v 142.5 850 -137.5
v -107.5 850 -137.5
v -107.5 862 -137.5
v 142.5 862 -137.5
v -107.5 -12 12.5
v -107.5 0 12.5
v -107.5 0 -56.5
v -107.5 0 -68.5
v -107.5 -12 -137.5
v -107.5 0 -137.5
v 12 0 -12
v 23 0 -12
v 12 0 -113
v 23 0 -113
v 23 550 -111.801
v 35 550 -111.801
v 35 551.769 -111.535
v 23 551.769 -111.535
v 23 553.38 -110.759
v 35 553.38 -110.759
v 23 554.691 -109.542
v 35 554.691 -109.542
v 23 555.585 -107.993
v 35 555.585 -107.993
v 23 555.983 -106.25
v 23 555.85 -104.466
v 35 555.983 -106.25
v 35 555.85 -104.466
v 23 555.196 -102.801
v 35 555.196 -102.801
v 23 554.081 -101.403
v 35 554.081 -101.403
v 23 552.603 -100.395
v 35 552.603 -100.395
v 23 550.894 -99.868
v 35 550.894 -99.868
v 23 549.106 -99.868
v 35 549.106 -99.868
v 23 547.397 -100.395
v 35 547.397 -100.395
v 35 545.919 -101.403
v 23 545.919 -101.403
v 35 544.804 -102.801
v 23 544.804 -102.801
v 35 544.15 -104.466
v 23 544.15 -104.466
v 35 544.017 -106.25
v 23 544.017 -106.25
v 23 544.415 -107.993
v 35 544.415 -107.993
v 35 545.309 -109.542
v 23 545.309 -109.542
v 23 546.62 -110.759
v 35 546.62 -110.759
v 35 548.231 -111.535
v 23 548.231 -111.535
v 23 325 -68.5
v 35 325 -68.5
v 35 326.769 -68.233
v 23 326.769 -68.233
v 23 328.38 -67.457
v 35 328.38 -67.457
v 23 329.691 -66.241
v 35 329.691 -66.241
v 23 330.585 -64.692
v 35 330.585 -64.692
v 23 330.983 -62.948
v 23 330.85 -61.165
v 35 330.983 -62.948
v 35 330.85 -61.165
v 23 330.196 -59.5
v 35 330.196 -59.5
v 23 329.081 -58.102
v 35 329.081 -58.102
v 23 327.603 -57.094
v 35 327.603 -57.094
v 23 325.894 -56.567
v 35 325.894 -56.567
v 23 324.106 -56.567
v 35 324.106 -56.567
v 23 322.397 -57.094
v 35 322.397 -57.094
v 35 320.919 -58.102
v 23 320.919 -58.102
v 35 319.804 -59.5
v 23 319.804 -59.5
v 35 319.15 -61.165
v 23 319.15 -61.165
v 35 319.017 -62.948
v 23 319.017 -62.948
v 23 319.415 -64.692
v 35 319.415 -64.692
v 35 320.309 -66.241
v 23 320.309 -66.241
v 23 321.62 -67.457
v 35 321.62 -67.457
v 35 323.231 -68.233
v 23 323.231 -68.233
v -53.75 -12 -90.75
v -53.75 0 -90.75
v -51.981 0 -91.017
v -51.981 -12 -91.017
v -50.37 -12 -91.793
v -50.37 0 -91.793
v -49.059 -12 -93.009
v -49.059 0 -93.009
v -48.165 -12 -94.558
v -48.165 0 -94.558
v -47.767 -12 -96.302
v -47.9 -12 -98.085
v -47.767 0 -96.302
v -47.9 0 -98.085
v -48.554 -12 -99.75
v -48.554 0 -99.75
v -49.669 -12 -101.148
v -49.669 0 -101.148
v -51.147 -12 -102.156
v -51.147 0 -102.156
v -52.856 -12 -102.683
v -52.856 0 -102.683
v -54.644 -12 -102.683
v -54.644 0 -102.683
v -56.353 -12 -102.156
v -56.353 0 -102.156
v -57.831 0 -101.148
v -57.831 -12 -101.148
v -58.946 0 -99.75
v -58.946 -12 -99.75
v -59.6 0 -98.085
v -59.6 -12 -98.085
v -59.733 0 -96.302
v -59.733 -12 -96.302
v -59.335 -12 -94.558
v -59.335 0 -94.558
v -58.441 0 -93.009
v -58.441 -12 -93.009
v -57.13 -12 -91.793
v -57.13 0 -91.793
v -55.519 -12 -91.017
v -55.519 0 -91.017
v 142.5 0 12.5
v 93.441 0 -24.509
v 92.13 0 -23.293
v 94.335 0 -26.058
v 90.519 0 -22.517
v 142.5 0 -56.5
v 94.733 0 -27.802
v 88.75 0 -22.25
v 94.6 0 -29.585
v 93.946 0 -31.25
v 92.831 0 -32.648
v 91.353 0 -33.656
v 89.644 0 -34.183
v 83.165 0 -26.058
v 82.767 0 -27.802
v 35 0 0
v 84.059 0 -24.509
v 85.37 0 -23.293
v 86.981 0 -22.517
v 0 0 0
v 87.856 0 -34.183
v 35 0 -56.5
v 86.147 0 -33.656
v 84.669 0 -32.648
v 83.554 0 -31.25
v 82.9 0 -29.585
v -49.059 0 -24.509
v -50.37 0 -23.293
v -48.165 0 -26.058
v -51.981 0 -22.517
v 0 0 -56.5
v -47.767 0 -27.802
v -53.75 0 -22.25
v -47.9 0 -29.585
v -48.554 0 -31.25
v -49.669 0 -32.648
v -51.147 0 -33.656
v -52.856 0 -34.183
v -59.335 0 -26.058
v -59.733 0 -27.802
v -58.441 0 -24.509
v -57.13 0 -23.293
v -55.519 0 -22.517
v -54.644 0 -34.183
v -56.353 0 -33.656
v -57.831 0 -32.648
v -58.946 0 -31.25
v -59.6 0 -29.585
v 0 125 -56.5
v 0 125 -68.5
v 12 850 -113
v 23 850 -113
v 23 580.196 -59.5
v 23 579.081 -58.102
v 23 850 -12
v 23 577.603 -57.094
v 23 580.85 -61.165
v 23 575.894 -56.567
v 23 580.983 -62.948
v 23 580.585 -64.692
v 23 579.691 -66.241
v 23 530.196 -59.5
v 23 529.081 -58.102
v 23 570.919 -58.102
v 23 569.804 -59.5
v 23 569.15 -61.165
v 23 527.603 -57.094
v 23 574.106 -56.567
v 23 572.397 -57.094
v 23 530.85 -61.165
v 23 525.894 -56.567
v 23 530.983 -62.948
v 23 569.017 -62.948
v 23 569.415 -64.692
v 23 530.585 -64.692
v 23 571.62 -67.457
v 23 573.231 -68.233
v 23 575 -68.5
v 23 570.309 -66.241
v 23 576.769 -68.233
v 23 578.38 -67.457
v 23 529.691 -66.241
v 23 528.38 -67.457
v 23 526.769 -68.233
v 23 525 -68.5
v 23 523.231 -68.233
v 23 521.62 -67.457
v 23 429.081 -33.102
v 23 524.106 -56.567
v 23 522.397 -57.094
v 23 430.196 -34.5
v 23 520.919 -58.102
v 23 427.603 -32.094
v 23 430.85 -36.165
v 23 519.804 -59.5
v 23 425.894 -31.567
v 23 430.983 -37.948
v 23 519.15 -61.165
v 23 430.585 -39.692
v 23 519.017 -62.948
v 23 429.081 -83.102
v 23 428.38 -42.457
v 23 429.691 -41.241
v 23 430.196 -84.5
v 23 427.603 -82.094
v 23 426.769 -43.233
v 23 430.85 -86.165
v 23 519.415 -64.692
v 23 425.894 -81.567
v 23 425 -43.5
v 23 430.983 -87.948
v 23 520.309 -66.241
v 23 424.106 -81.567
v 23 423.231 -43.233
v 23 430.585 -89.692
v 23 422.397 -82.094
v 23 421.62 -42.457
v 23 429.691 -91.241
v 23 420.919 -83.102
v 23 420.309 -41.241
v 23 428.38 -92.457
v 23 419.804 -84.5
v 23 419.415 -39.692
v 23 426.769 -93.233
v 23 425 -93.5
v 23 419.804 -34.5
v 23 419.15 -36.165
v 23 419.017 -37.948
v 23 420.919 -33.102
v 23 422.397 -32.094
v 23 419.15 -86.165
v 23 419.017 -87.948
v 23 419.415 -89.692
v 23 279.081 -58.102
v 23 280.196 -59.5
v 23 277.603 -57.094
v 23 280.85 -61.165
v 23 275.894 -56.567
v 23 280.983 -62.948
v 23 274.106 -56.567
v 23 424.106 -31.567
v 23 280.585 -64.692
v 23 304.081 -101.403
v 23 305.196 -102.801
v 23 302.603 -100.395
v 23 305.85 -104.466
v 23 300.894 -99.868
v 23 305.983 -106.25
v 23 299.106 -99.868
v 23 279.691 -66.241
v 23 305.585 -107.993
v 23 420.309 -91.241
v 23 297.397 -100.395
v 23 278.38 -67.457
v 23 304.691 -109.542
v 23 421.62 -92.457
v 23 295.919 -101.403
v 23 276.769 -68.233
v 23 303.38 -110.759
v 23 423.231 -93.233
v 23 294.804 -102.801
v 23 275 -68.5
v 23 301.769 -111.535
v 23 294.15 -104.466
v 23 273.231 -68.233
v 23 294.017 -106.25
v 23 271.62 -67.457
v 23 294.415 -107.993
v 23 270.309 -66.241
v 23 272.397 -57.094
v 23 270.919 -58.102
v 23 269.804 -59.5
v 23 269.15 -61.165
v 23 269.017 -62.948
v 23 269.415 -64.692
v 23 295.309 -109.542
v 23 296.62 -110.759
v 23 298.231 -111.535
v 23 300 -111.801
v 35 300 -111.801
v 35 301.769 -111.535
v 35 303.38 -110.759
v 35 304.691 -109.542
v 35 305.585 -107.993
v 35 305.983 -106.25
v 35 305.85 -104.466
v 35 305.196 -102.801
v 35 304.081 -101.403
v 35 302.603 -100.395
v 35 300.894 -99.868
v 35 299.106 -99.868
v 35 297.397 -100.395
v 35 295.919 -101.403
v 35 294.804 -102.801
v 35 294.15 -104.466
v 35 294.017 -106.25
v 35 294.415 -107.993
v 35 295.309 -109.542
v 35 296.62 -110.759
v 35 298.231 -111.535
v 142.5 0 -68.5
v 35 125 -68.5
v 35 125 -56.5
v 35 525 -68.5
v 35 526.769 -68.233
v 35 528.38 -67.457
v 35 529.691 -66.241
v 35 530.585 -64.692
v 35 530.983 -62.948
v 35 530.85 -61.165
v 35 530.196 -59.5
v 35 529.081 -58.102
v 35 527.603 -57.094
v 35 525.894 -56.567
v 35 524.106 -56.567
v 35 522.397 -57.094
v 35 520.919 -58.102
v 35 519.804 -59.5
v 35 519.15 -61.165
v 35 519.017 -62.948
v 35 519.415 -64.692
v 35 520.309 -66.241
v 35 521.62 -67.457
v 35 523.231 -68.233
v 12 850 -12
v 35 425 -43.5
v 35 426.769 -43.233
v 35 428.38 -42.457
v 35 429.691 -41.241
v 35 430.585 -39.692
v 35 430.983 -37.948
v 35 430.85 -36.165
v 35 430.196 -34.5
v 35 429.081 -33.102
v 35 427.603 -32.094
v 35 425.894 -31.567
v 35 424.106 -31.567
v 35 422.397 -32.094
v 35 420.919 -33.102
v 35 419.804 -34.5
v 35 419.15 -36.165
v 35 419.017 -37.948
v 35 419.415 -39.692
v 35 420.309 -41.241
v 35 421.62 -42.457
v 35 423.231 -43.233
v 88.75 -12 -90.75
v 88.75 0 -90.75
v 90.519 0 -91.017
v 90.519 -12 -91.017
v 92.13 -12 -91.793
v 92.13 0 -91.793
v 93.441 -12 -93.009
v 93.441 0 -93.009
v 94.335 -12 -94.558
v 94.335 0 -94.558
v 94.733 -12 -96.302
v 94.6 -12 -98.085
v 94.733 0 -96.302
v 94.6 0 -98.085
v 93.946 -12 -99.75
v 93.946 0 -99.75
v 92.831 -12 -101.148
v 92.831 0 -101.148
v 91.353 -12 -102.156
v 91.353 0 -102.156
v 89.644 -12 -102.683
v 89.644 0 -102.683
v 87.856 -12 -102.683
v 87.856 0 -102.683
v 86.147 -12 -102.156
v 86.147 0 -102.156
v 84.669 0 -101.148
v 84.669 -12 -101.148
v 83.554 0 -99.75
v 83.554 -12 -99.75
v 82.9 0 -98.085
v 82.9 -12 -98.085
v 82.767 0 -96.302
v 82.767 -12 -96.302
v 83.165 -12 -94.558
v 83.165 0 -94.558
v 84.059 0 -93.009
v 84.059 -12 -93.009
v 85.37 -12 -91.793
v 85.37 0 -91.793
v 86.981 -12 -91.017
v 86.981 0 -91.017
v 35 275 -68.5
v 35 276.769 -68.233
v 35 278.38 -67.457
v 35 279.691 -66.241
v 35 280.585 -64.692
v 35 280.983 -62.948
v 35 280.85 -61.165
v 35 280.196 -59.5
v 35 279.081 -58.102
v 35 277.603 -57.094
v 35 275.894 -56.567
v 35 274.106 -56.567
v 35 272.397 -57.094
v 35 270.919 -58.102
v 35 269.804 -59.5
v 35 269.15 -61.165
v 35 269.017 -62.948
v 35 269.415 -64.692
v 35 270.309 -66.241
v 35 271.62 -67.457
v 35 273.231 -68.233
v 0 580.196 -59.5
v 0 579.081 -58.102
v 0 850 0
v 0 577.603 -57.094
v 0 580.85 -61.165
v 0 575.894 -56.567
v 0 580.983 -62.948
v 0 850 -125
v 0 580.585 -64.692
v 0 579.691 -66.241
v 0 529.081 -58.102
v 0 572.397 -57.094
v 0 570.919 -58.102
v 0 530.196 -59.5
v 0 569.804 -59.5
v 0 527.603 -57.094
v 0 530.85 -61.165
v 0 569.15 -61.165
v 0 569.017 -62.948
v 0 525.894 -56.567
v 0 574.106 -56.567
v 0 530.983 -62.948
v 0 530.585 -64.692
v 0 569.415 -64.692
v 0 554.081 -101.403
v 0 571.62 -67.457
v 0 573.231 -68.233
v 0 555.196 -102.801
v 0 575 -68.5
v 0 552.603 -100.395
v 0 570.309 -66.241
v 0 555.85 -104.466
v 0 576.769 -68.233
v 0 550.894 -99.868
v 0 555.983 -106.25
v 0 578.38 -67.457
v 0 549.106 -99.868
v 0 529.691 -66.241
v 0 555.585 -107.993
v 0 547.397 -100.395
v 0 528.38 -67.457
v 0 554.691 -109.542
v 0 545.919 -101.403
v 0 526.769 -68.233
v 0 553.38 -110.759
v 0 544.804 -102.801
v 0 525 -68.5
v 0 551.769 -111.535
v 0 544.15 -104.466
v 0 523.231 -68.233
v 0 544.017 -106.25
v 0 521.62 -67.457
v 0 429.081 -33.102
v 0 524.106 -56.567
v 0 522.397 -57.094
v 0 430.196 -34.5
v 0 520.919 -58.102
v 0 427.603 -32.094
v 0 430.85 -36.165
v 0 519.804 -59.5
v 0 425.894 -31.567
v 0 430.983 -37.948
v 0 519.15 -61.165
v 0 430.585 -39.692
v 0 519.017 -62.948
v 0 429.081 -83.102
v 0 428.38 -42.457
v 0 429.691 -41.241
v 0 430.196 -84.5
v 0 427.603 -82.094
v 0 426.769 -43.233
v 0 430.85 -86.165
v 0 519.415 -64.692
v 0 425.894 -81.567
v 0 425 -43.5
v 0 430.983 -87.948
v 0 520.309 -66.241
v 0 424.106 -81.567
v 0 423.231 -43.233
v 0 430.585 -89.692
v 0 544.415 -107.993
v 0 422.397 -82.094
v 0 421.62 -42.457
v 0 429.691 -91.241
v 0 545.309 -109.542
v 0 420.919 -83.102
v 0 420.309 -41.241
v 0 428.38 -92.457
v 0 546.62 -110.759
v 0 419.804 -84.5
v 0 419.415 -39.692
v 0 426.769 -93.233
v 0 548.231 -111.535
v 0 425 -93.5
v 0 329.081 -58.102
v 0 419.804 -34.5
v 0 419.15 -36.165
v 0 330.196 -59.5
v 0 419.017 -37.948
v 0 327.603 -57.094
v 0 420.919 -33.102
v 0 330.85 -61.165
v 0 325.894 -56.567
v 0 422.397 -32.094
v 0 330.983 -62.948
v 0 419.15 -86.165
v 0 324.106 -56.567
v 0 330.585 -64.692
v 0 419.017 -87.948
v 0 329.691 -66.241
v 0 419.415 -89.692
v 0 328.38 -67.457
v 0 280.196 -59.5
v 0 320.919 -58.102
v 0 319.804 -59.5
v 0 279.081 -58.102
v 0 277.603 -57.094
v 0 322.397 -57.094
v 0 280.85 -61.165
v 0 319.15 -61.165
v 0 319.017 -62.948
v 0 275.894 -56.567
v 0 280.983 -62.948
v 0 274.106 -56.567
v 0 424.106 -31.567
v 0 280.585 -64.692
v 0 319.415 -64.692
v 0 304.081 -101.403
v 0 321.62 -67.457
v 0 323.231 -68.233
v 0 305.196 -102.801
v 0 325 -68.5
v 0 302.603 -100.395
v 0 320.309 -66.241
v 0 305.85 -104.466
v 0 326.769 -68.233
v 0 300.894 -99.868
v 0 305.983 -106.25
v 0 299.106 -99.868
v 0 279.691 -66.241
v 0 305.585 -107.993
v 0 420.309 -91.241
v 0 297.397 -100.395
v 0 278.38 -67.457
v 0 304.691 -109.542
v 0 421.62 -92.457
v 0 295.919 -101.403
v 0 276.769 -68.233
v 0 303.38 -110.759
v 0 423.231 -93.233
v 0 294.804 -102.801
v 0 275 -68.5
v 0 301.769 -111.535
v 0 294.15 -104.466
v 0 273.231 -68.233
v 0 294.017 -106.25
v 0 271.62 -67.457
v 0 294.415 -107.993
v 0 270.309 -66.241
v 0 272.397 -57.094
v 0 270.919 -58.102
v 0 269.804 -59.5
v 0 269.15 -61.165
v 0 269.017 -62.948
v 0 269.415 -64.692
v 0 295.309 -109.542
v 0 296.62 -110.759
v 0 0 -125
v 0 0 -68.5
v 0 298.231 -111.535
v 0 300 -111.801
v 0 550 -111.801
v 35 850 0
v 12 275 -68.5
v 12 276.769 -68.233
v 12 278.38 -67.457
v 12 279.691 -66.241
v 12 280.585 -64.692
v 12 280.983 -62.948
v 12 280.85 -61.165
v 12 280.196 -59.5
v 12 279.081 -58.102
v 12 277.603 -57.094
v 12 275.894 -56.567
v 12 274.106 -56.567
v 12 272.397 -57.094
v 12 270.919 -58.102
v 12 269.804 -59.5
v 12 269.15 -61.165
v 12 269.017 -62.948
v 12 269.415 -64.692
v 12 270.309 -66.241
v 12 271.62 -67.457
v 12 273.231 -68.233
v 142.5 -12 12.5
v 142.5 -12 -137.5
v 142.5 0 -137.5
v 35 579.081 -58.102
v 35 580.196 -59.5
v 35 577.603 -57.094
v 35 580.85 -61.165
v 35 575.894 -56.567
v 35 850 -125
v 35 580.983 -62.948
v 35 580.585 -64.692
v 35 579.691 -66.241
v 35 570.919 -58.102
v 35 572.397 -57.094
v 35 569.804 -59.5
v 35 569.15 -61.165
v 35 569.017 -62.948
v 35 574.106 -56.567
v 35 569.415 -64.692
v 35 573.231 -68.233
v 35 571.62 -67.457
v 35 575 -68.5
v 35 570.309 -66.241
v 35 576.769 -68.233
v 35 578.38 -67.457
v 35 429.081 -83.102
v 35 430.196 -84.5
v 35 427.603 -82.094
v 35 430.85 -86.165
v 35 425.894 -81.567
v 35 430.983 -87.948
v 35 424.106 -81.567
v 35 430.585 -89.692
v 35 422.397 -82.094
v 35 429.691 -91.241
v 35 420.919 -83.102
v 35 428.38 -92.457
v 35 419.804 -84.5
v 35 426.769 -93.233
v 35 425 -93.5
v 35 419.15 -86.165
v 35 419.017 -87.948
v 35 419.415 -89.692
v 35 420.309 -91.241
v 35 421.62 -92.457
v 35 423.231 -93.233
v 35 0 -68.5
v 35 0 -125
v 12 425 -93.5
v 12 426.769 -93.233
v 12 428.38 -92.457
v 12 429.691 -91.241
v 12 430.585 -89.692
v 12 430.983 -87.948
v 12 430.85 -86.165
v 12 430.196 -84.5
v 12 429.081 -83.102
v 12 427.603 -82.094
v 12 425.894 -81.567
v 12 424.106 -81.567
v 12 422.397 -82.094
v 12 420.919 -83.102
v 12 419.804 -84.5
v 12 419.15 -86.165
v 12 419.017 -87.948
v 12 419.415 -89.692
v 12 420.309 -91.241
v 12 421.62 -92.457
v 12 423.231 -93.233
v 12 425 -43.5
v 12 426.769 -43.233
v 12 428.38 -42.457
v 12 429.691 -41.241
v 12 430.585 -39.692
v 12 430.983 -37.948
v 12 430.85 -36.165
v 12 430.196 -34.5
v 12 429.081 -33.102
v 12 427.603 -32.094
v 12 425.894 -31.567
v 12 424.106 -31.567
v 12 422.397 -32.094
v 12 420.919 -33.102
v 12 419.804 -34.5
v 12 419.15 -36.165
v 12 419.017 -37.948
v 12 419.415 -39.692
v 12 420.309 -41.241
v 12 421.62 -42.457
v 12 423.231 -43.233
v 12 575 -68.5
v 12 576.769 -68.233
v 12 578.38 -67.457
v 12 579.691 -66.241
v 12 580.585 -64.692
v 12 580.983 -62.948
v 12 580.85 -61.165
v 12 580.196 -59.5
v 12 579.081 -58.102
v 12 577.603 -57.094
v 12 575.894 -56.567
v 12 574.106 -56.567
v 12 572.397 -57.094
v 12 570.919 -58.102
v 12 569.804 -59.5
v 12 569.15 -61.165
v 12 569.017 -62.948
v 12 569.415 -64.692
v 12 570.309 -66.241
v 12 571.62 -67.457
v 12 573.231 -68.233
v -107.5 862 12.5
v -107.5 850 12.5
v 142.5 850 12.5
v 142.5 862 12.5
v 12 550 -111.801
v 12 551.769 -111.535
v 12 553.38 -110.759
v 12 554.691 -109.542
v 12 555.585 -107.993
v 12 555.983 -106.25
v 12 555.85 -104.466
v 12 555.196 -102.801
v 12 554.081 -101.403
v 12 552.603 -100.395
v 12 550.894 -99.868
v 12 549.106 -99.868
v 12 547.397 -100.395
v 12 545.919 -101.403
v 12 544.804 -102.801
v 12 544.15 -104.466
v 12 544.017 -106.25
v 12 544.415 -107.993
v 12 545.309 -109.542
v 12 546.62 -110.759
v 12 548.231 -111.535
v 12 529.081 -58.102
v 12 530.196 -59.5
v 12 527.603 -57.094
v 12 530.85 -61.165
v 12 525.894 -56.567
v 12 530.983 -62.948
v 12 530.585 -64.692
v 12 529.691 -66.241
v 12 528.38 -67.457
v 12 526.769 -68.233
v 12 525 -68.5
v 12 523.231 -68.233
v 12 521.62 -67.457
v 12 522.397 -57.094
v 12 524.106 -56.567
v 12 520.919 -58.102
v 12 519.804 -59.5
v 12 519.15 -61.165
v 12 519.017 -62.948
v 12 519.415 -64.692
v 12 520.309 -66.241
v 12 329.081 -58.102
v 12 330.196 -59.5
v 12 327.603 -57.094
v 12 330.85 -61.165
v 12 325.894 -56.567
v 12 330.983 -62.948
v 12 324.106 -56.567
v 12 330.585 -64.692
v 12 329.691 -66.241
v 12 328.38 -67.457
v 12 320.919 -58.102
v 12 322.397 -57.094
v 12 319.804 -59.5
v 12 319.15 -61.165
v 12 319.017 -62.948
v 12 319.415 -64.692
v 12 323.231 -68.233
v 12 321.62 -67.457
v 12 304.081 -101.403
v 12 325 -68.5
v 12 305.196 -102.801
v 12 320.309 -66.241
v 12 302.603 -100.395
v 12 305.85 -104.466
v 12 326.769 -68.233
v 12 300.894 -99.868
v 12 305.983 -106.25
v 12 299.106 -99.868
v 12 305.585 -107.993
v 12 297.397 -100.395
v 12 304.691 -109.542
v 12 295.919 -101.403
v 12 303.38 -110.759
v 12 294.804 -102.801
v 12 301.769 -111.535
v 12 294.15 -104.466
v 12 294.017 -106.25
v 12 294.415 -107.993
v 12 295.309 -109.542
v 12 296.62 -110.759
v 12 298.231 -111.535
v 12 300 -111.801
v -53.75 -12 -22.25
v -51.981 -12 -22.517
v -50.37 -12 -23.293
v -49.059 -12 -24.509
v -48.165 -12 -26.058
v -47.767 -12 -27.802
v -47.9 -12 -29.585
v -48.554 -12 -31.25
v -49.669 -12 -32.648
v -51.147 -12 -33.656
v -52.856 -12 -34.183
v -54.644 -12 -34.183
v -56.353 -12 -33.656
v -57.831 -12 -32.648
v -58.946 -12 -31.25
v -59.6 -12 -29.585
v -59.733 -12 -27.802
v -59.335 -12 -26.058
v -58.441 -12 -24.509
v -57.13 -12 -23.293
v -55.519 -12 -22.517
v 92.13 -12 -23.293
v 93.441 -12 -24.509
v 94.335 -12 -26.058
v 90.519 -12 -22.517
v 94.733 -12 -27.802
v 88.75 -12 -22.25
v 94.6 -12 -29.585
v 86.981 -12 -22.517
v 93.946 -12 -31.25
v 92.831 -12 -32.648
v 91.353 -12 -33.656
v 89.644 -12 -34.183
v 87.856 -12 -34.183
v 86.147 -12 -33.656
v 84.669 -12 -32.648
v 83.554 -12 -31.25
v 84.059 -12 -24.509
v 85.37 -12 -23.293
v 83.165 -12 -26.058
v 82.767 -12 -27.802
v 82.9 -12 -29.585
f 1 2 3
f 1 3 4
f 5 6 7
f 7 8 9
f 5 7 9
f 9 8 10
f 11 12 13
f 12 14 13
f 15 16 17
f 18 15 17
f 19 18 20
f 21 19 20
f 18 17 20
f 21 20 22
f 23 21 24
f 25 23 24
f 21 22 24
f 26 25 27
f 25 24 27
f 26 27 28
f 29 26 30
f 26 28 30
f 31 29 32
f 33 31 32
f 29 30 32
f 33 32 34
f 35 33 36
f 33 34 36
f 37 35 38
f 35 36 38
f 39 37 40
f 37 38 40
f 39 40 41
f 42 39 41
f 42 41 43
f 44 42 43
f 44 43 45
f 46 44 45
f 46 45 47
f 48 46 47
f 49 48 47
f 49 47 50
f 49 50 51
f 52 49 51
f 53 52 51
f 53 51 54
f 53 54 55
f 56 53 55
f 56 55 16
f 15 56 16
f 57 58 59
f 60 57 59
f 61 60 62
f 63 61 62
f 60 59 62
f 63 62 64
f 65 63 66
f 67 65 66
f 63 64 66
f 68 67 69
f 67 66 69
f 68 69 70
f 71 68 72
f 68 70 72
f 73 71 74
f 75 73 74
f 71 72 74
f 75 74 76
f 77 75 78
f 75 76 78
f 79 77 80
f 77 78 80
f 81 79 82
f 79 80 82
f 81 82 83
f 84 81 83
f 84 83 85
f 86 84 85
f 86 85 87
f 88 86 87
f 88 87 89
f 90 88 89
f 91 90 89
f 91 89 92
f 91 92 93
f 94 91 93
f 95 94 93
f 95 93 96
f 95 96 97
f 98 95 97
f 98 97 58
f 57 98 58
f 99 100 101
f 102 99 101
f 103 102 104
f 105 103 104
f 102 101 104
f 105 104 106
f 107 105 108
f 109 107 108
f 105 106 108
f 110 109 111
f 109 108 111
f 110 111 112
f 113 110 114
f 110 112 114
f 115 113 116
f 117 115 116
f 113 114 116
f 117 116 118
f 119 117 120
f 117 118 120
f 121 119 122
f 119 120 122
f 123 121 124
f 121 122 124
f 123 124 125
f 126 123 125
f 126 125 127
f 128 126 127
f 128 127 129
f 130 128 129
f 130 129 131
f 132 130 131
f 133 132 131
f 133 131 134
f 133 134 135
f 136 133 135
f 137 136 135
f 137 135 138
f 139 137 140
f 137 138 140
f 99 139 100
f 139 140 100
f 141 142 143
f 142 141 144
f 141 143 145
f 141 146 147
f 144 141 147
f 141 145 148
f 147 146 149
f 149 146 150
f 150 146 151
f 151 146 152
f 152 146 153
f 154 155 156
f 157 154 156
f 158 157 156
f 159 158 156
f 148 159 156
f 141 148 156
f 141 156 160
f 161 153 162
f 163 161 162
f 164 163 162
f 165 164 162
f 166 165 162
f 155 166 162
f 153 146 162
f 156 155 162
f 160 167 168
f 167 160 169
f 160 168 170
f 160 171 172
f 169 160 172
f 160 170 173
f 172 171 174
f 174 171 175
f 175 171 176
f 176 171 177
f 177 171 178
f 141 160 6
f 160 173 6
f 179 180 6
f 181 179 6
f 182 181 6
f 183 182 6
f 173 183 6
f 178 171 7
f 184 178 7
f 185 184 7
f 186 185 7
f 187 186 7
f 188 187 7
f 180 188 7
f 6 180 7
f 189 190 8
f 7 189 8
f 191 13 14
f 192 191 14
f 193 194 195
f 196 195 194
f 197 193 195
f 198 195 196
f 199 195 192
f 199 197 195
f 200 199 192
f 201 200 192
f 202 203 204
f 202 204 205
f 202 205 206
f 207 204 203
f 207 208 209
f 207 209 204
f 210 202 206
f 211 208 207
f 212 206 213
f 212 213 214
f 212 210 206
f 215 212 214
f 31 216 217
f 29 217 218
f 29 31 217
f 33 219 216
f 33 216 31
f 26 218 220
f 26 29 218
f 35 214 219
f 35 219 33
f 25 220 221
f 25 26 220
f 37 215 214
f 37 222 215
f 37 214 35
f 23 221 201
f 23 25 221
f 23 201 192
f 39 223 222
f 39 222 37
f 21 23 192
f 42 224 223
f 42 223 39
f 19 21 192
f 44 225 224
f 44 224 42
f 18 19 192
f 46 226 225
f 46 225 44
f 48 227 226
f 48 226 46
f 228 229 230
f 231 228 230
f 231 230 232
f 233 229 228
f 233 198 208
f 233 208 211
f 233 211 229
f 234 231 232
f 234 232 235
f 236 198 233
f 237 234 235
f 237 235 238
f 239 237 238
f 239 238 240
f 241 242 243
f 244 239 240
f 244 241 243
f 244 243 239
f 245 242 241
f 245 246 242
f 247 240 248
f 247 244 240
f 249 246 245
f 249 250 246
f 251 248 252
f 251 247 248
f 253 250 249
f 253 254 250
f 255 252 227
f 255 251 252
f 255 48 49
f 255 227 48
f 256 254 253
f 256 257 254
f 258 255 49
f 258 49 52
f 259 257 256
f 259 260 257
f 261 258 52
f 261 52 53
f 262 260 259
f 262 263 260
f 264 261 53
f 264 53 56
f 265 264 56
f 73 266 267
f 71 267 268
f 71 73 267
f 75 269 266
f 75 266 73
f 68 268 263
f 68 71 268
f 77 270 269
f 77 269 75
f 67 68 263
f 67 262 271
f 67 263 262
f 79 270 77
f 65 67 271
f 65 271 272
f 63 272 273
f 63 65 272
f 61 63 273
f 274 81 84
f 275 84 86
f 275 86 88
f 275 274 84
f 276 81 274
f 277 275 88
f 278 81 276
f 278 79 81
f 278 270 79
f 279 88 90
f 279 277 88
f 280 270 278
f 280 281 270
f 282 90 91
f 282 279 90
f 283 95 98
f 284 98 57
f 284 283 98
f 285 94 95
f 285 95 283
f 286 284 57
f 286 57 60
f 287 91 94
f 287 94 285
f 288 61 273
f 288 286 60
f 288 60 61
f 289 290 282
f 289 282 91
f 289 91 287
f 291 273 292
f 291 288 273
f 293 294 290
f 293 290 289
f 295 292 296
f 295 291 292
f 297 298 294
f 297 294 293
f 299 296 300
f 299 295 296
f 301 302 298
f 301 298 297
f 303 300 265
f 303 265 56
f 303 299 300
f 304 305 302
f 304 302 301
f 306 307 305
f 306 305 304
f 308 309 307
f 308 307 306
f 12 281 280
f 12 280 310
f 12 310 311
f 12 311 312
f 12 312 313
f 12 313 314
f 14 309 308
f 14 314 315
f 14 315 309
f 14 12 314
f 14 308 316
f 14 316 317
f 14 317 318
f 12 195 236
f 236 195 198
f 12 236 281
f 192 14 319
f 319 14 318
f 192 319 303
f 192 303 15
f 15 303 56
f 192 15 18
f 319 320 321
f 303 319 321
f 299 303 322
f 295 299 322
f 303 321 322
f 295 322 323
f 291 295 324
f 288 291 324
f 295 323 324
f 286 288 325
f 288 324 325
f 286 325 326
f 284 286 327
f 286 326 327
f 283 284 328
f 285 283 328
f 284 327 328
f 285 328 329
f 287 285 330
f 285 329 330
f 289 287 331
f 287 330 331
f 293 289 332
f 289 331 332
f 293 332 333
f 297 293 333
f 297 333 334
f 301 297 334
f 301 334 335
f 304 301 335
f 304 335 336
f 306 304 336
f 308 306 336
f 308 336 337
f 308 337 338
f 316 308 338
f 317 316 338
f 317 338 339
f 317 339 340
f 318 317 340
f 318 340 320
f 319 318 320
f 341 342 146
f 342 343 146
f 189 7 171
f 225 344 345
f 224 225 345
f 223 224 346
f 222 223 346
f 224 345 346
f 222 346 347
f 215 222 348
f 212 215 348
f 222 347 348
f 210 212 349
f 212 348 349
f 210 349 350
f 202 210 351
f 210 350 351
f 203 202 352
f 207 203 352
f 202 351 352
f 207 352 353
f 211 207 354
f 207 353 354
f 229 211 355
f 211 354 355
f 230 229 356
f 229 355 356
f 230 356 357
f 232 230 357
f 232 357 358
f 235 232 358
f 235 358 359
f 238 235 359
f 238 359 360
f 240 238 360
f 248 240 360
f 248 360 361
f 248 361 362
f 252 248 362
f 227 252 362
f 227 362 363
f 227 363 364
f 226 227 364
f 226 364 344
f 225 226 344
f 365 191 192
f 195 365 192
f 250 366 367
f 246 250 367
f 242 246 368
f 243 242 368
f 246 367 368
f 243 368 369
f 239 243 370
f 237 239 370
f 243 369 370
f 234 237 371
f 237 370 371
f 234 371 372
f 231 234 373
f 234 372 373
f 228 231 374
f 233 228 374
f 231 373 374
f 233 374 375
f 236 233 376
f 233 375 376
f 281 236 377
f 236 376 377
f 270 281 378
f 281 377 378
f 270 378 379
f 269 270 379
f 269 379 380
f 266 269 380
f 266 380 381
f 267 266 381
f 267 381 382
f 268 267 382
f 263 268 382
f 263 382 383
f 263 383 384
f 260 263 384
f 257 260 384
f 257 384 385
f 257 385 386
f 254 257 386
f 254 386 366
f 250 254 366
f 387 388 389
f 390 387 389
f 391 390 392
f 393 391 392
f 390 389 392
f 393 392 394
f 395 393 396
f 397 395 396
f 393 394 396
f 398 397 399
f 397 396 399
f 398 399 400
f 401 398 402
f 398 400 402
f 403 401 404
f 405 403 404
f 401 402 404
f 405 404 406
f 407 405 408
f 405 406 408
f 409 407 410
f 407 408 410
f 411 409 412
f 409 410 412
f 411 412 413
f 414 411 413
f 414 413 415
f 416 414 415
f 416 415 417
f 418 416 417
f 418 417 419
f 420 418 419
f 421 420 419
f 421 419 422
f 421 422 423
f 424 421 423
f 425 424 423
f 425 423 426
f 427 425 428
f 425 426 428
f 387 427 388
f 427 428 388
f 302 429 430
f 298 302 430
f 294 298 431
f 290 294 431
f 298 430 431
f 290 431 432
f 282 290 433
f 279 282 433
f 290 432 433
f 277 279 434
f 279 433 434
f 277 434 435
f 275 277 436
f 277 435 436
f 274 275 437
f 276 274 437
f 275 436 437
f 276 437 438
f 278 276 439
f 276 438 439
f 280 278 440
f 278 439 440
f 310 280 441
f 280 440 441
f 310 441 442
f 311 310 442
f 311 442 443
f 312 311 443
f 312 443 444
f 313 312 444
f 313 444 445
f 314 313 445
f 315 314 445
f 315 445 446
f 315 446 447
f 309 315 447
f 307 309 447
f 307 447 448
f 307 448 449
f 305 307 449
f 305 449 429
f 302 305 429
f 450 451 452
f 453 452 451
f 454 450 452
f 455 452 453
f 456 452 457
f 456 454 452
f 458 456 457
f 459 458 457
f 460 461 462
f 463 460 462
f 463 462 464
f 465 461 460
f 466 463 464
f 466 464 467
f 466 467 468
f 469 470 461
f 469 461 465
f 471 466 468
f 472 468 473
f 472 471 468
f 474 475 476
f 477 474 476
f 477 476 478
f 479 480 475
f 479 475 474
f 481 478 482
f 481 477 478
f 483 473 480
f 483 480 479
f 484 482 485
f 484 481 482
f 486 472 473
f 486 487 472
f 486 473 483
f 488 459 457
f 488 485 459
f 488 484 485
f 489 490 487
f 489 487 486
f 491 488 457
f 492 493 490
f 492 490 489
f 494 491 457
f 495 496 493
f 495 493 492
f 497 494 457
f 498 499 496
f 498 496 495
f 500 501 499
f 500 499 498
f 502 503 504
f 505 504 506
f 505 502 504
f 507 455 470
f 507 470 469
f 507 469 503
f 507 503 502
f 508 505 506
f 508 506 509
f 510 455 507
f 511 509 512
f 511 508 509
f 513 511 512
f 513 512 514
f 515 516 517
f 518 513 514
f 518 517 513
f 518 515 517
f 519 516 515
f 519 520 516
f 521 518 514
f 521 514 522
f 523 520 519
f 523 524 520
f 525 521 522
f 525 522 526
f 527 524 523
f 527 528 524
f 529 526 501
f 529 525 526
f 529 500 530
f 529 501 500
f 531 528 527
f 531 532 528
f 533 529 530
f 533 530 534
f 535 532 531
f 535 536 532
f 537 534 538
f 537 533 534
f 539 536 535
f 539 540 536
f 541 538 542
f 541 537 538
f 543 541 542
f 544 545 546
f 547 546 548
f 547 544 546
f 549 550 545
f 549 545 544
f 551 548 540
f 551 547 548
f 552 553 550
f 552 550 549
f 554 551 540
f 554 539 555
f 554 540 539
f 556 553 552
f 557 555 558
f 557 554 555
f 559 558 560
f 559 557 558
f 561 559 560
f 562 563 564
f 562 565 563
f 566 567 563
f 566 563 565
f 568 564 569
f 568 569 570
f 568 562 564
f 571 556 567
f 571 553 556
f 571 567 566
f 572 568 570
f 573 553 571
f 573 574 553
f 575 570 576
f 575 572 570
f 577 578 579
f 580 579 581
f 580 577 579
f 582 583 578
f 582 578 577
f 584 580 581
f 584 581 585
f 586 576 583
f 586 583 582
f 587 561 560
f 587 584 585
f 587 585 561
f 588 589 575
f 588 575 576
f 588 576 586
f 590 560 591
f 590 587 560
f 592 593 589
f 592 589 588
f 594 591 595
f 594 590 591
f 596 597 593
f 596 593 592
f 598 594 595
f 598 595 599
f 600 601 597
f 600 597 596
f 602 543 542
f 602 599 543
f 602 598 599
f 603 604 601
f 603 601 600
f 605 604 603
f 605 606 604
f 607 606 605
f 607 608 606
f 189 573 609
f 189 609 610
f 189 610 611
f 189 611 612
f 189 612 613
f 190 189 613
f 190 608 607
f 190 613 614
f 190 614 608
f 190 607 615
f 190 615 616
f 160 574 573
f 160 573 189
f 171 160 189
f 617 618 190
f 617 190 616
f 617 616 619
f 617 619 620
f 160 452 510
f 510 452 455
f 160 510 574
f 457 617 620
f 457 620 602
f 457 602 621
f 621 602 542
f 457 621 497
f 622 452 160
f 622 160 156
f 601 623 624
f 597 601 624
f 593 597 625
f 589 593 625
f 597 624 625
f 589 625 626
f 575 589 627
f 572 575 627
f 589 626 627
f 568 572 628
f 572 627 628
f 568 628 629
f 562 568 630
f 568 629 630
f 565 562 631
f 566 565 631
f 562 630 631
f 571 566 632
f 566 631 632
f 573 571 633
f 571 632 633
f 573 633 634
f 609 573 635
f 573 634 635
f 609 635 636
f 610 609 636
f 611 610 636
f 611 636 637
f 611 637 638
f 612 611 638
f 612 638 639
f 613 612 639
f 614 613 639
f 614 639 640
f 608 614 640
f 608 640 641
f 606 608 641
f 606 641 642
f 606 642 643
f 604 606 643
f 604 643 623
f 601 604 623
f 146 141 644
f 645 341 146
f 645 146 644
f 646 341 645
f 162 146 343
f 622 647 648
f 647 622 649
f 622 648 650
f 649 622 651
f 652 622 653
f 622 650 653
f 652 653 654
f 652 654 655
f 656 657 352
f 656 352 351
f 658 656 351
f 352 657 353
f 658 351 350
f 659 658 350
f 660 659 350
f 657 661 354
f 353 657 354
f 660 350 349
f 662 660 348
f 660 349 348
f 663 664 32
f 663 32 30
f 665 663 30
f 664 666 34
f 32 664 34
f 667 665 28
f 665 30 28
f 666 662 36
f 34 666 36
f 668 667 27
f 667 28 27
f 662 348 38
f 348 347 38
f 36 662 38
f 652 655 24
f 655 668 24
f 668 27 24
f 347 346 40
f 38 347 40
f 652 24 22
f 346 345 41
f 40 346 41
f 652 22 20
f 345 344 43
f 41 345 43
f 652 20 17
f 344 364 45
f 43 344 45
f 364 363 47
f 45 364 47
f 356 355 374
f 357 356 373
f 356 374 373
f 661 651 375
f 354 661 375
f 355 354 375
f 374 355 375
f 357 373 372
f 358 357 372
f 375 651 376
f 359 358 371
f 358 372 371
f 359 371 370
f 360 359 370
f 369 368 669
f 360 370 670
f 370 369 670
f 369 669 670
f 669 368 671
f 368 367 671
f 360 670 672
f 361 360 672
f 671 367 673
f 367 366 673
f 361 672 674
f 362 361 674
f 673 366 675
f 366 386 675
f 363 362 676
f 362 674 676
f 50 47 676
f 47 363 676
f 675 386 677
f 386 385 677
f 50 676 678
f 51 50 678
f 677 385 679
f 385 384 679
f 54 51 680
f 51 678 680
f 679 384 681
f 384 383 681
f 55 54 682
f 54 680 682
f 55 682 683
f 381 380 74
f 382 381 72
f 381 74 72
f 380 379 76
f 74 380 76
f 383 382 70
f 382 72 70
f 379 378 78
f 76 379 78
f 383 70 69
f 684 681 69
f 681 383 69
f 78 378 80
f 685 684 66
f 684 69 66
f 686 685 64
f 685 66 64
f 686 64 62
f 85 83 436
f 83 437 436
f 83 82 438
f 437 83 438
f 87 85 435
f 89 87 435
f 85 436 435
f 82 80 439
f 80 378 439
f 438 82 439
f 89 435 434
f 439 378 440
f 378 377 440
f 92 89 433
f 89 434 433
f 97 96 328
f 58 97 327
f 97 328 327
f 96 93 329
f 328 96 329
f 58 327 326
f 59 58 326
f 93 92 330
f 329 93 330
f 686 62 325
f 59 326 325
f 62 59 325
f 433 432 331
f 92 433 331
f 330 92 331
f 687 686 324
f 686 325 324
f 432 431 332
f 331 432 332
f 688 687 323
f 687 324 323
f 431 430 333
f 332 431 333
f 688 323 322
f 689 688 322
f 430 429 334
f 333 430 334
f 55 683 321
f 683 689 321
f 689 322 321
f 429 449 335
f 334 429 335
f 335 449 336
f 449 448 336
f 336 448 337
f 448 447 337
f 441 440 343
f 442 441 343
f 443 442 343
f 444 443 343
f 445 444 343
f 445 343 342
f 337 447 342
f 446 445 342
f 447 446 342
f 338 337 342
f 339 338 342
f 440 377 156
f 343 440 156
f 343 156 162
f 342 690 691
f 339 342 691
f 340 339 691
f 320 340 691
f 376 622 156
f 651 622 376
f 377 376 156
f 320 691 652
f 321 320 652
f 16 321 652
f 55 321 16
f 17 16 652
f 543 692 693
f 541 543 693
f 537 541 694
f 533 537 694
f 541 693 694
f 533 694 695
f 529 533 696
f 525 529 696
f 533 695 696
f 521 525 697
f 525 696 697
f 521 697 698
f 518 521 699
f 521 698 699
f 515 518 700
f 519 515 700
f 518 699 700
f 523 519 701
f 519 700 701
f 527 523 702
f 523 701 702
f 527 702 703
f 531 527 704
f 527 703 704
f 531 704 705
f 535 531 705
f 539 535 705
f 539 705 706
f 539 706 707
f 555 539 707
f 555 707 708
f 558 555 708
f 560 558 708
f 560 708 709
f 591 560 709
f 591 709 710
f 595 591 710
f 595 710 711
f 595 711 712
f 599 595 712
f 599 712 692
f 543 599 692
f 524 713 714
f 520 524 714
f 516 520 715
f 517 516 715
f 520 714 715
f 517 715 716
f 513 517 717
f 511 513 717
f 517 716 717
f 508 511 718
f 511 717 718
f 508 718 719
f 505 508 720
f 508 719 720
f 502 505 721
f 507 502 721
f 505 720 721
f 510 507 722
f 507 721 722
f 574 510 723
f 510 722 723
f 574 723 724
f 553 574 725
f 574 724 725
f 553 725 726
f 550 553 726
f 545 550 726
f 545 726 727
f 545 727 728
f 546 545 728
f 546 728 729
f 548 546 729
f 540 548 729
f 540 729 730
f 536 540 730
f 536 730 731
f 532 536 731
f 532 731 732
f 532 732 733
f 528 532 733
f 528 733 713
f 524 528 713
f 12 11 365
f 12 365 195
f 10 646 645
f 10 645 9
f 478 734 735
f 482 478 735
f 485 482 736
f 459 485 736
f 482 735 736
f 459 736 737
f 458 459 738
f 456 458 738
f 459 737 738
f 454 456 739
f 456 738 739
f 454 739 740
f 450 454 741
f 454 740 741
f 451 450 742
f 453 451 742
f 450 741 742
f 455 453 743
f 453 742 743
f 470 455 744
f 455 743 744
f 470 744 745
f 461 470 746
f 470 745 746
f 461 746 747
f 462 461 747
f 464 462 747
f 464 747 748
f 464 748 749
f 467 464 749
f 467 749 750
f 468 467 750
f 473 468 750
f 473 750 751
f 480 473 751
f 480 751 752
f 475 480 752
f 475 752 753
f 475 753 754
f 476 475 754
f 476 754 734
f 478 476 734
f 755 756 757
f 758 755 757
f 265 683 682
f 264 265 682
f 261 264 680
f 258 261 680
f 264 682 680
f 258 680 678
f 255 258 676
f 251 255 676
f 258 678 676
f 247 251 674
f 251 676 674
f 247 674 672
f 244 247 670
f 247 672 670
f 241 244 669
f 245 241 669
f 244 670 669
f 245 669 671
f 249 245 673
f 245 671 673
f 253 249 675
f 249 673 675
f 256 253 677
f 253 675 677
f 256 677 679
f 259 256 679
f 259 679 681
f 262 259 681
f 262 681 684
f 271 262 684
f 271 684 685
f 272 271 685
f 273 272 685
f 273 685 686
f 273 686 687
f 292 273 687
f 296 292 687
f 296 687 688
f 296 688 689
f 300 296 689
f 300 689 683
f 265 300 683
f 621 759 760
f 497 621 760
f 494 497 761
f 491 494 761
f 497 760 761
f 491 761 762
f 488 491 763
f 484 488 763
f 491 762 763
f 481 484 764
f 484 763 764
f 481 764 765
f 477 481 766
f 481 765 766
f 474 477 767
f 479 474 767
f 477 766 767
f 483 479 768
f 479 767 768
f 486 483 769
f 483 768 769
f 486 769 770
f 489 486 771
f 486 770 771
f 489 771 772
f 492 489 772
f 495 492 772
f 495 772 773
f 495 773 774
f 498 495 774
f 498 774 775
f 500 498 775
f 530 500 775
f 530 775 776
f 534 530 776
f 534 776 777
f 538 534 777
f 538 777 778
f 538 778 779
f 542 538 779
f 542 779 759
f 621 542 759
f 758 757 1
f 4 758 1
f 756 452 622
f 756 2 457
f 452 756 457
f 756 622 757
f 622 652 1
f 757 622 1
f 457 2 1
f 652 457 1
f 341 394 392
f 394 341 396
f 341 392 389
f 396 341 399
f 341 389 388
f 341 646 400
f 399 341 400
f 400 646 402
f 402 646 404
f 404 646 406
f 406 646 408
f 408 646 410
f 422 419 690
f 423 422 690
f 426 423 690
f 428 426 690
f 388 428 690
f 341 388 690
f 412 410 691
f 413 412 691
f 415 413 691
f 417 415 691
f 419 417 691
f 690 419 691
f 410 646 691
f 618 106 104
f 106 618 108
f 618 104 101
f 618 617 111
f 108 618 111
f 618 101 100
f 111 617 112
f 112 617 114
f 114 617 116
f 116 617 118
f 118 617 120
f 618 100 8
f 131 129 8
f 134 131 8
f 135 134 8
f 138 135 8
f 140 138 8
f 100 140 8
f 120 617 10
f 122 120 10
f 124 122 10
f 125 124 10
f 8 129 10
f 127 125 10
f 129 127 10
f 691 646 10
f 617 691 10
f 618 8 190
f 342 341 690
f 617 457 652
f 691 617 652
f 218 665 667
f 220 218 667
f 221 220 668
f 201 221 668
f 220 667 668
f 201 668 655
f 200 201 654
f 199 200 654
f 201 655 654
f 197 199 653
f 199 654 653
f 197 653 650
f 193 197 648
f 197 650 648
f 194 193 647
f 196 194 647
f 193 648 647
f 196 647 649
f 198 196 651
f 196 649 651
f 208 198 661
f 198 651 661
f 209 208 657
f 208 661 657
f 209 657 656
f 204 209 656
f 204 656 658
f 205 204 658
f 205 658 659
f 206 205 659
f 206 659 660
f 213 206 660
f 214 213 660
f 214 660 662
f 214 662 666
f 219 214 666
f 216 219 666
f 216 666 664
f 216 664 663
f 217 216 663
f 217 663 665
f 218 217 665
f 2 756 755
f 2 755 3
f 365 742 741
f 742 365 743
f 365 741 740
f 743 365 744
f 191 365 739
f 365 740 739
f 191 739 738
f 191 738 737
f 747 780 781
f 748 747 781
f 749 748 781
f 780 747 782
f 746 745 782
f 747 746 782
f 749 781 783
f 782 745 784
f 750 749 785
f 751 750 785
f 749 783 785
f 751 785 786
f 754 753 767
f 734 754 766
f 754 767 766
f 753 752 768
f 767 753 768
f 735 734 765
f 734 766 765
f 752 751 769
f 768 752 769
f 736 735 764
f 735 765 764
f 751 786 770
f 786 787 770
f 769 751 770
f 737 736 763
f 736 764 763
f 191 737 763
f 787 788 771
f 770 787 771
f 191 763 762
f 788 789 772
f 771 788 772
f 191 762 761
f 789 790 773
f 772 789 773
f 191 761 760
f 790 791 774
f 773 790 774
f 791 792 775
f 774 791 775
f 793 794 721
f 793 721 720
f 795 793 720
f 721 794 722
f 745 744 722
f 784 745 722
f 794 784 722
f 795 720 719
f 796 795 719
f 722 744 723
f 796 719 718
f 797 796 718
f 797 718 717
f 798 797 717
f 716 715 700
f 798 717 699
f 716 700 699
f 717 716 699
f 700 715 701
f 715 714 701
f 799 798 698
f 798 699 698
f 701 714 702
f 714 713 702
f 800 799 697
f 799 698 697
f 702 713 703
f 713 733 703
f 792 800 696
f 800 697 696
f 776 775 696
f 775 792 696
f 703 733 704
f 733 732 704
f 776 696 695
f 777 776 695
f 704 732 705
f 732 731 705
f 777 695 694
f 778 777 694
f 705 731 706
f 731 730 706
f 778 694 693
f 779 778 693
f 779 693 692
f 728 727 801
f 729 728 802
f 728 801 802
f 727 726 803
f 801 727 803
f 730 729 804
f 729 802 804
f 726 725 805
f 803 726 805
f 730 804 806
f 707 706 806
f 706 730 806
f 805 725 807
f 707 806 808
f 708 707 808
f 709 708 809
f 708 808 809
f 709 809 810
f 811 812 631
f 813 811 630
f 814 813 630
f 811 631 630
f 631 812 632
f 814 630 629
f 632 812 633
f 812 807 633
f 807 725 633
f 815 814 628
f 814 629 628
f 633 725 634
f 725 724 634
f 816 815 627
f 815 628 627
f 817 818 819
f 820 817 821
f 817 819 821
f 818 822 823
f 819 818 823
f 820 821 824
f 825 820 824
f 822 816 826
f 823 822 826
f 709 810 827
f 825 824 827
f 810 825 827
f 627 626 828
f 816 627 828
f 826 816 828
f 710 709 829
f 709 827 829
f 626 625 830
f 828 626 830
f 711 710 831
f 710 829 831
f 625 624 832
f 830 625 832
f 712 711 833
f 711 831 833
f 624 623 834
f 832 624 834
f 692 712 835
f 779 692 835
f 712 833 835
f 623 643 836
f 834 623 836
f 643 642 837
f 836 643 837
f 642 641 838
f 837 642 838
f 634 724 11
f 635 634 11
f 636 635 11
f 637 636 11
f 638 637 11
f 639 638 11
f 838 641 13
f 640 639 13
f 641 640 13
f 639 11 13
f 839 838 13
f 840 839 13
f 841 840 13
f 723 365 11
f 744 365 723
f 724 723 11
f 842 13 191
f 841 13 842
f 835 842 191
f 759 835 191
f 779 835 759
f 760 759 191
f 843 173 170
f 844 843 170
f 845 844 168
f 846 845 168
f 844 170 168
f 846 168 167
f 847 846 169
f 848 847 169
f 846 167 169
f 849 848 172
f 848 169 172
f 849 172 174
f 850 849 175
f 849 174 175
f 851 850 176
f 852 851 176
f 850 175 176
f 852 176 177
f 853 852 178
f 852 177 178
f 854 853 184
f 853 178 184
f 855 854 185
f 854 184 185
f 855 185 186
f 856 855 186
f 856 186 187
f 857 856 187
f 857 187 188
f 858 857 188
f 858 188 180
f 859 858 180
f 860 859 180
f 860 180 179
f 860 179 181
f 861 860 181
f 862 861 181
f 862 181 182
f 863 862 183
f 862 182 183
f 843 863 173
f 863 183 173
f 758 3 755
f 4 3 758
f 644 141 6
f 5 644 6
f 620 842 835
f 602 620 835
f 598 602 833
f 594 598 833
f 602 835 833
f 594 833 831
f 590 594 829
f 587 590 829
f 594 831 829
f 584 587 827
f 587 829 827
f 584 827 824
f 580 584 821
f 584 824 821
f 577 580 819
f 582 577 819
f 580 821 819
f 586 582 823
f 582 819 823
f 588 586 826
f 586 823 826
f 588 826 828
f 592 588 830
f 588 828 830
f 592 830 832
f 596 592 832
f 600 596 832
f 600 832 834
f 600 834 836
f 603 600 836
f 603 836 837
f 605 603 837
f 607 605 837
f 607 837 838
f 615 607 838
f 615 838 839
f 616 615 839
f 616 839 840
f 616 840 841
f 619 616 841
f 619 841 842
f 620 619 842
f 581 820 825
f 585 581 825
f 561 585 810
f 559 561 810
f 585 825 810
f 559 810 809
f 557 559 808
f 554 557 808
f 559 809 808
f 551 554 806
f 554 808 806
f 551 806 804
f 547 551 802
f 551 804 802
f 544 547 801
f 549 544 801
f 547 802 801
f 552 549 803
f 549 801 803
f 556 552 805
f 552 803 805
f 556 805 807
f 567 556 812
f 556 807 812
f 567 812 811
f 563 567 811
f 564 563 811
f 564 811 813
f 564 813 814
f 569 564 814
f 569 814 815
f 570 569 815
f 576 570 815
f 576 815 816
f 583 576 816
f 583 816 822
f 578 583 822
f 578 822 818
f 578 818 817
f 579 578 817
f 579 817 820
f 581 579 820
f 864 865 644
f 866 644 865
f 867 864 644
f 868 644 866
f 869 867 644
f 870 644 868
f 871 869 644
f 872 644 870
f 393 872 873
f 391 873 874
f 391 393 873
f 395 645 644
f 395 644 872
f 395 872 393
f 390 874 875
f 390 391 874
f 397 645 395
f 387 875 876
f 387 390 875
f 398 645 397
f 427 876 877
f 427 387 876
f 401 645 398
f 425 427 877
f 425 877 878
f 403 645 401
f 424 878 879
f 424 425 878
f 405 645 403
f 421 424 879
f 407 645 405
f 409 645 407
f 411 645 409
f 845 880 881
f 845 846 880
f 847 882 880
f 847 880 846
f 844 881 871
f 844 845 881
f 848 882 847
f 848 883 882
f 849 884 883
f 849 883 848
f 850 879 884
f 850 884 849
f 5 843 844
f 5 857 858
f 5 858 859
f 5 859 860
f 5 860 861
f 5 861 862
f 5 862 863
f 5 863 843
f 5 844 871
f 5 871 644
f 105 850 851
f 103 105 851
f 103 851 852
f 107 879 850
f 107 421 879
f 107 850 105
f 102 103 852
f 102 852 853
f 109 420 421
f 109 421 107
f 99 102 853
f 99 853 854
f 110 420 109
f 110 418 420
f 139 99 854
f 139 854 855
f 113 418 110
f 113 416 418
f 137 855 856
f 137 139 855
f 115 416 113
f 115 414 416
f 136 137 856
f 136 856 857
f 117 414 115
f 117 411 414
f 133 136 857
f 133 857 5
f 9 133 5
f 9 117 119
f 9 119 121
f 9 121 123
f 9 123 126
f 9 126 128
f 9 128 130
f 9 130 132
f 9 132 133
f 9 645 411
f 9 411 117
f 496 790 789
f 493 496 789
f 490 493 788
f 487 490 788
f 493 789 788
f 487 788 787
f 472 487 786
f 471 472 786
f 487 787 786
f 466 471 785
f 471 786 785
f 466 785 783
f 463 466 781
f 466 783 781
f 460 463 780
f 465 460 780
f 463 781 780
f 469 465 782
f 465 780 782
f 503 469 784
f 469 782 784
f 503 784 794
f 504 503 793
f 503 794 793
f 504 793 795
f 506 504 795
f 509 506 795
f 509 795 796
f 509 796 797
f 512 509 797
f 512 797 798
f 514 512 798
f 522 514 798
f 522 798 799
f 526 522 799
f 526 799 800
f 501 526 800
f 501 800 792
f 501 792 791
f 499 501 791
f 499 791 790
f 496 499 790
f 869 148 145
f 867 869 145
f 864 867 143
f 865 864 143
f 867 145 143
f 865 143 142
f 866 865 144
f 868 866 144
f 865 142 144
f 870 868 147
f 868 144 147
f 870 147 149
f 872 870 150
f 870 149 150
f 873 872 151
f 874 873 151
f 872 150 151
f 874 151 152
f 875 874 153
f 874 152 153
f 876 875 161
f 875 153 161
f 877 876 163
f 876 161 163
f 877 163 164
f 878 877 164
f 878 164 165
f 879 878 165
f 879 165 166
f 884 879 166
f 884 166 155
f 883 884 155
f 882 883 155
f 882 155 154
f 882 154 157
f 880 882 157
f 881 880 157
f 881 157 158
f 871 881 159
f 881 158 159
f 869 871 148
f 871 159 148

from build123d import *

# Parameters (mm, degrees)
SKETCH2_W           = 35
SKETCH2_H           = 125
SKETCH2_W_2         = 11
SKETCH2_H_2         = 101
BOSS_EXTRUDE1_DEPTH = 850
SKETCH3_R           = 6
CUT_EXTRUDE1_DEPTH  = 860.854638878
SKETCH4_W           = 250
SKETCH4_H           = 150
BOSS_EXTRUDE2_DEPTH = 12
SKETCH5_W           = 250
SKETCH5_H           = 150
BOSS_EXTRUDE3_DEPTH = 12
BOSS_EXTRUDE4_START = -62.5
BOSS_EXTRUDE4_DEPTH = 6
SKETCH8_R           = 6
CUT_EXTRUDE2_DEPTH  = 12


with BuildPart() as part:
    # Sketch2 → Boss-Extrude1 (new body)
    with BuildSketch(Plane(origin=(0, 0, 0), x_dir=(1, 0, 0), z_dir=(0, 1, 0))):
        with Locations((17.5, 62.5)):
            Rectangle(SKETCH2_W, SKETCH2_H)
        with Locations((17.5, 62.5)):
            Rectangle(SKETCH2_W_2, SKETCH2_H_2, mode=Mode.SUBTRACT)
    extrude(amount=BOSS_EXTRUDE1_DEPTH)

    # Sketch3 → Cut-Extrude1 (cut, through all)
    with BuildSketch(Plane(origin=(35, 0, 0), x_dir=(0, 0, -1), z_dir=(1, 0, 0))):
        with Locations((62.5, 575)):
            Circle(SKETCH3_R)
        with Locations((62.5, 525)):
            Circle(SKETCH3_R)
        with Locations((105.801270189, 550)):
            Circle(SKETCH3_R)
        with Locations((37.5, 425)):
            Circle(SKETCH3_R)
        with Locations((87.5, 425)):
            Circle(SKETCH3_R)
        with Locations((105.801270189, 300)):
            Circle(SKETCH3_R)
        with Locations((62.5, 325)):
            Circle(SKETCH3_R)
        with Locations((62.5, 275)):
            Circle(SKETCH3_R)
    extrude(amount=-CUT_EXTRUDE1_DEPTH, mode=Mode.SUBTRACT)

    # Sketch4 → Boss-Extrude2 (add)
    with BuildSketch(Plane(origin=(0, 0, 0), x_dir=(-1, 0, 0), z_dir=(0, -1, 0))):
        with Locations((-17.5, 62.5)):
            Rectangle(SKETCH4_W, SKETCH4_H)
    extrude(amount=BOSS_EXTRUDE2_DEPTH)

    # Sketch5 → Boss-Extrude3 (add)
    with BuildSketch(Plane(origin=(0, 850, 0), x_dir=(1, 0, 0), z_dir=(0, 1, 0))):
        with Locations((17.5, 62.5)):
            Rectangle(SKETCH5_W, SKETCH5_H)
    extrude(amount=BOSS_EXTRUDE3_DEPTH)

    # Sketch7 → Boss-Extrude4 (add, symmetric)
    with BuildSketch(Plane(origin=(0, 0, -125), x_dir=(-1, 0, 0), z_dir=(0, 0, -1)).offset(BOSS_EXTRUDE4_START)):
        Polygon((-35, 0), (-35, 125), (-142.5, 0), align=None)
        Polygon((0, 125), (107.5, 0), (0, 0), align=None)
    extrude(amount=BOSS_EXTRUDE4_DEPTH, both=True)

    # Sketch8 → Cut-Extrude2 (cut)
    with BuildSketch(Plane(origin=(0, 0, 0), x_dir=(1, 0, 0), z_dir=(0, 1, 0))):
        with Locations(Location((-53.75, 28.25, 0), (0, 0, 270))):
            Circle(SKETCH8_R)
        with Locations(Location((-53.75, 96.75, 0), (0, 0, 270))):
            Circle(SKETCH8_R)
        with Locations(Location((88.75, 28.25, 0), (0, 0, 270))):
            Circle(SKETCH8_R)
        with Locations(Location((88.75, 96.75, 0), (0, 0, 270))):
            Circle(SKETCH8_R)
    extrude(amount=-CUT_EXTRUDE2_DEPTH, mode=Mode.SUBTRACT)


solid = part.part
